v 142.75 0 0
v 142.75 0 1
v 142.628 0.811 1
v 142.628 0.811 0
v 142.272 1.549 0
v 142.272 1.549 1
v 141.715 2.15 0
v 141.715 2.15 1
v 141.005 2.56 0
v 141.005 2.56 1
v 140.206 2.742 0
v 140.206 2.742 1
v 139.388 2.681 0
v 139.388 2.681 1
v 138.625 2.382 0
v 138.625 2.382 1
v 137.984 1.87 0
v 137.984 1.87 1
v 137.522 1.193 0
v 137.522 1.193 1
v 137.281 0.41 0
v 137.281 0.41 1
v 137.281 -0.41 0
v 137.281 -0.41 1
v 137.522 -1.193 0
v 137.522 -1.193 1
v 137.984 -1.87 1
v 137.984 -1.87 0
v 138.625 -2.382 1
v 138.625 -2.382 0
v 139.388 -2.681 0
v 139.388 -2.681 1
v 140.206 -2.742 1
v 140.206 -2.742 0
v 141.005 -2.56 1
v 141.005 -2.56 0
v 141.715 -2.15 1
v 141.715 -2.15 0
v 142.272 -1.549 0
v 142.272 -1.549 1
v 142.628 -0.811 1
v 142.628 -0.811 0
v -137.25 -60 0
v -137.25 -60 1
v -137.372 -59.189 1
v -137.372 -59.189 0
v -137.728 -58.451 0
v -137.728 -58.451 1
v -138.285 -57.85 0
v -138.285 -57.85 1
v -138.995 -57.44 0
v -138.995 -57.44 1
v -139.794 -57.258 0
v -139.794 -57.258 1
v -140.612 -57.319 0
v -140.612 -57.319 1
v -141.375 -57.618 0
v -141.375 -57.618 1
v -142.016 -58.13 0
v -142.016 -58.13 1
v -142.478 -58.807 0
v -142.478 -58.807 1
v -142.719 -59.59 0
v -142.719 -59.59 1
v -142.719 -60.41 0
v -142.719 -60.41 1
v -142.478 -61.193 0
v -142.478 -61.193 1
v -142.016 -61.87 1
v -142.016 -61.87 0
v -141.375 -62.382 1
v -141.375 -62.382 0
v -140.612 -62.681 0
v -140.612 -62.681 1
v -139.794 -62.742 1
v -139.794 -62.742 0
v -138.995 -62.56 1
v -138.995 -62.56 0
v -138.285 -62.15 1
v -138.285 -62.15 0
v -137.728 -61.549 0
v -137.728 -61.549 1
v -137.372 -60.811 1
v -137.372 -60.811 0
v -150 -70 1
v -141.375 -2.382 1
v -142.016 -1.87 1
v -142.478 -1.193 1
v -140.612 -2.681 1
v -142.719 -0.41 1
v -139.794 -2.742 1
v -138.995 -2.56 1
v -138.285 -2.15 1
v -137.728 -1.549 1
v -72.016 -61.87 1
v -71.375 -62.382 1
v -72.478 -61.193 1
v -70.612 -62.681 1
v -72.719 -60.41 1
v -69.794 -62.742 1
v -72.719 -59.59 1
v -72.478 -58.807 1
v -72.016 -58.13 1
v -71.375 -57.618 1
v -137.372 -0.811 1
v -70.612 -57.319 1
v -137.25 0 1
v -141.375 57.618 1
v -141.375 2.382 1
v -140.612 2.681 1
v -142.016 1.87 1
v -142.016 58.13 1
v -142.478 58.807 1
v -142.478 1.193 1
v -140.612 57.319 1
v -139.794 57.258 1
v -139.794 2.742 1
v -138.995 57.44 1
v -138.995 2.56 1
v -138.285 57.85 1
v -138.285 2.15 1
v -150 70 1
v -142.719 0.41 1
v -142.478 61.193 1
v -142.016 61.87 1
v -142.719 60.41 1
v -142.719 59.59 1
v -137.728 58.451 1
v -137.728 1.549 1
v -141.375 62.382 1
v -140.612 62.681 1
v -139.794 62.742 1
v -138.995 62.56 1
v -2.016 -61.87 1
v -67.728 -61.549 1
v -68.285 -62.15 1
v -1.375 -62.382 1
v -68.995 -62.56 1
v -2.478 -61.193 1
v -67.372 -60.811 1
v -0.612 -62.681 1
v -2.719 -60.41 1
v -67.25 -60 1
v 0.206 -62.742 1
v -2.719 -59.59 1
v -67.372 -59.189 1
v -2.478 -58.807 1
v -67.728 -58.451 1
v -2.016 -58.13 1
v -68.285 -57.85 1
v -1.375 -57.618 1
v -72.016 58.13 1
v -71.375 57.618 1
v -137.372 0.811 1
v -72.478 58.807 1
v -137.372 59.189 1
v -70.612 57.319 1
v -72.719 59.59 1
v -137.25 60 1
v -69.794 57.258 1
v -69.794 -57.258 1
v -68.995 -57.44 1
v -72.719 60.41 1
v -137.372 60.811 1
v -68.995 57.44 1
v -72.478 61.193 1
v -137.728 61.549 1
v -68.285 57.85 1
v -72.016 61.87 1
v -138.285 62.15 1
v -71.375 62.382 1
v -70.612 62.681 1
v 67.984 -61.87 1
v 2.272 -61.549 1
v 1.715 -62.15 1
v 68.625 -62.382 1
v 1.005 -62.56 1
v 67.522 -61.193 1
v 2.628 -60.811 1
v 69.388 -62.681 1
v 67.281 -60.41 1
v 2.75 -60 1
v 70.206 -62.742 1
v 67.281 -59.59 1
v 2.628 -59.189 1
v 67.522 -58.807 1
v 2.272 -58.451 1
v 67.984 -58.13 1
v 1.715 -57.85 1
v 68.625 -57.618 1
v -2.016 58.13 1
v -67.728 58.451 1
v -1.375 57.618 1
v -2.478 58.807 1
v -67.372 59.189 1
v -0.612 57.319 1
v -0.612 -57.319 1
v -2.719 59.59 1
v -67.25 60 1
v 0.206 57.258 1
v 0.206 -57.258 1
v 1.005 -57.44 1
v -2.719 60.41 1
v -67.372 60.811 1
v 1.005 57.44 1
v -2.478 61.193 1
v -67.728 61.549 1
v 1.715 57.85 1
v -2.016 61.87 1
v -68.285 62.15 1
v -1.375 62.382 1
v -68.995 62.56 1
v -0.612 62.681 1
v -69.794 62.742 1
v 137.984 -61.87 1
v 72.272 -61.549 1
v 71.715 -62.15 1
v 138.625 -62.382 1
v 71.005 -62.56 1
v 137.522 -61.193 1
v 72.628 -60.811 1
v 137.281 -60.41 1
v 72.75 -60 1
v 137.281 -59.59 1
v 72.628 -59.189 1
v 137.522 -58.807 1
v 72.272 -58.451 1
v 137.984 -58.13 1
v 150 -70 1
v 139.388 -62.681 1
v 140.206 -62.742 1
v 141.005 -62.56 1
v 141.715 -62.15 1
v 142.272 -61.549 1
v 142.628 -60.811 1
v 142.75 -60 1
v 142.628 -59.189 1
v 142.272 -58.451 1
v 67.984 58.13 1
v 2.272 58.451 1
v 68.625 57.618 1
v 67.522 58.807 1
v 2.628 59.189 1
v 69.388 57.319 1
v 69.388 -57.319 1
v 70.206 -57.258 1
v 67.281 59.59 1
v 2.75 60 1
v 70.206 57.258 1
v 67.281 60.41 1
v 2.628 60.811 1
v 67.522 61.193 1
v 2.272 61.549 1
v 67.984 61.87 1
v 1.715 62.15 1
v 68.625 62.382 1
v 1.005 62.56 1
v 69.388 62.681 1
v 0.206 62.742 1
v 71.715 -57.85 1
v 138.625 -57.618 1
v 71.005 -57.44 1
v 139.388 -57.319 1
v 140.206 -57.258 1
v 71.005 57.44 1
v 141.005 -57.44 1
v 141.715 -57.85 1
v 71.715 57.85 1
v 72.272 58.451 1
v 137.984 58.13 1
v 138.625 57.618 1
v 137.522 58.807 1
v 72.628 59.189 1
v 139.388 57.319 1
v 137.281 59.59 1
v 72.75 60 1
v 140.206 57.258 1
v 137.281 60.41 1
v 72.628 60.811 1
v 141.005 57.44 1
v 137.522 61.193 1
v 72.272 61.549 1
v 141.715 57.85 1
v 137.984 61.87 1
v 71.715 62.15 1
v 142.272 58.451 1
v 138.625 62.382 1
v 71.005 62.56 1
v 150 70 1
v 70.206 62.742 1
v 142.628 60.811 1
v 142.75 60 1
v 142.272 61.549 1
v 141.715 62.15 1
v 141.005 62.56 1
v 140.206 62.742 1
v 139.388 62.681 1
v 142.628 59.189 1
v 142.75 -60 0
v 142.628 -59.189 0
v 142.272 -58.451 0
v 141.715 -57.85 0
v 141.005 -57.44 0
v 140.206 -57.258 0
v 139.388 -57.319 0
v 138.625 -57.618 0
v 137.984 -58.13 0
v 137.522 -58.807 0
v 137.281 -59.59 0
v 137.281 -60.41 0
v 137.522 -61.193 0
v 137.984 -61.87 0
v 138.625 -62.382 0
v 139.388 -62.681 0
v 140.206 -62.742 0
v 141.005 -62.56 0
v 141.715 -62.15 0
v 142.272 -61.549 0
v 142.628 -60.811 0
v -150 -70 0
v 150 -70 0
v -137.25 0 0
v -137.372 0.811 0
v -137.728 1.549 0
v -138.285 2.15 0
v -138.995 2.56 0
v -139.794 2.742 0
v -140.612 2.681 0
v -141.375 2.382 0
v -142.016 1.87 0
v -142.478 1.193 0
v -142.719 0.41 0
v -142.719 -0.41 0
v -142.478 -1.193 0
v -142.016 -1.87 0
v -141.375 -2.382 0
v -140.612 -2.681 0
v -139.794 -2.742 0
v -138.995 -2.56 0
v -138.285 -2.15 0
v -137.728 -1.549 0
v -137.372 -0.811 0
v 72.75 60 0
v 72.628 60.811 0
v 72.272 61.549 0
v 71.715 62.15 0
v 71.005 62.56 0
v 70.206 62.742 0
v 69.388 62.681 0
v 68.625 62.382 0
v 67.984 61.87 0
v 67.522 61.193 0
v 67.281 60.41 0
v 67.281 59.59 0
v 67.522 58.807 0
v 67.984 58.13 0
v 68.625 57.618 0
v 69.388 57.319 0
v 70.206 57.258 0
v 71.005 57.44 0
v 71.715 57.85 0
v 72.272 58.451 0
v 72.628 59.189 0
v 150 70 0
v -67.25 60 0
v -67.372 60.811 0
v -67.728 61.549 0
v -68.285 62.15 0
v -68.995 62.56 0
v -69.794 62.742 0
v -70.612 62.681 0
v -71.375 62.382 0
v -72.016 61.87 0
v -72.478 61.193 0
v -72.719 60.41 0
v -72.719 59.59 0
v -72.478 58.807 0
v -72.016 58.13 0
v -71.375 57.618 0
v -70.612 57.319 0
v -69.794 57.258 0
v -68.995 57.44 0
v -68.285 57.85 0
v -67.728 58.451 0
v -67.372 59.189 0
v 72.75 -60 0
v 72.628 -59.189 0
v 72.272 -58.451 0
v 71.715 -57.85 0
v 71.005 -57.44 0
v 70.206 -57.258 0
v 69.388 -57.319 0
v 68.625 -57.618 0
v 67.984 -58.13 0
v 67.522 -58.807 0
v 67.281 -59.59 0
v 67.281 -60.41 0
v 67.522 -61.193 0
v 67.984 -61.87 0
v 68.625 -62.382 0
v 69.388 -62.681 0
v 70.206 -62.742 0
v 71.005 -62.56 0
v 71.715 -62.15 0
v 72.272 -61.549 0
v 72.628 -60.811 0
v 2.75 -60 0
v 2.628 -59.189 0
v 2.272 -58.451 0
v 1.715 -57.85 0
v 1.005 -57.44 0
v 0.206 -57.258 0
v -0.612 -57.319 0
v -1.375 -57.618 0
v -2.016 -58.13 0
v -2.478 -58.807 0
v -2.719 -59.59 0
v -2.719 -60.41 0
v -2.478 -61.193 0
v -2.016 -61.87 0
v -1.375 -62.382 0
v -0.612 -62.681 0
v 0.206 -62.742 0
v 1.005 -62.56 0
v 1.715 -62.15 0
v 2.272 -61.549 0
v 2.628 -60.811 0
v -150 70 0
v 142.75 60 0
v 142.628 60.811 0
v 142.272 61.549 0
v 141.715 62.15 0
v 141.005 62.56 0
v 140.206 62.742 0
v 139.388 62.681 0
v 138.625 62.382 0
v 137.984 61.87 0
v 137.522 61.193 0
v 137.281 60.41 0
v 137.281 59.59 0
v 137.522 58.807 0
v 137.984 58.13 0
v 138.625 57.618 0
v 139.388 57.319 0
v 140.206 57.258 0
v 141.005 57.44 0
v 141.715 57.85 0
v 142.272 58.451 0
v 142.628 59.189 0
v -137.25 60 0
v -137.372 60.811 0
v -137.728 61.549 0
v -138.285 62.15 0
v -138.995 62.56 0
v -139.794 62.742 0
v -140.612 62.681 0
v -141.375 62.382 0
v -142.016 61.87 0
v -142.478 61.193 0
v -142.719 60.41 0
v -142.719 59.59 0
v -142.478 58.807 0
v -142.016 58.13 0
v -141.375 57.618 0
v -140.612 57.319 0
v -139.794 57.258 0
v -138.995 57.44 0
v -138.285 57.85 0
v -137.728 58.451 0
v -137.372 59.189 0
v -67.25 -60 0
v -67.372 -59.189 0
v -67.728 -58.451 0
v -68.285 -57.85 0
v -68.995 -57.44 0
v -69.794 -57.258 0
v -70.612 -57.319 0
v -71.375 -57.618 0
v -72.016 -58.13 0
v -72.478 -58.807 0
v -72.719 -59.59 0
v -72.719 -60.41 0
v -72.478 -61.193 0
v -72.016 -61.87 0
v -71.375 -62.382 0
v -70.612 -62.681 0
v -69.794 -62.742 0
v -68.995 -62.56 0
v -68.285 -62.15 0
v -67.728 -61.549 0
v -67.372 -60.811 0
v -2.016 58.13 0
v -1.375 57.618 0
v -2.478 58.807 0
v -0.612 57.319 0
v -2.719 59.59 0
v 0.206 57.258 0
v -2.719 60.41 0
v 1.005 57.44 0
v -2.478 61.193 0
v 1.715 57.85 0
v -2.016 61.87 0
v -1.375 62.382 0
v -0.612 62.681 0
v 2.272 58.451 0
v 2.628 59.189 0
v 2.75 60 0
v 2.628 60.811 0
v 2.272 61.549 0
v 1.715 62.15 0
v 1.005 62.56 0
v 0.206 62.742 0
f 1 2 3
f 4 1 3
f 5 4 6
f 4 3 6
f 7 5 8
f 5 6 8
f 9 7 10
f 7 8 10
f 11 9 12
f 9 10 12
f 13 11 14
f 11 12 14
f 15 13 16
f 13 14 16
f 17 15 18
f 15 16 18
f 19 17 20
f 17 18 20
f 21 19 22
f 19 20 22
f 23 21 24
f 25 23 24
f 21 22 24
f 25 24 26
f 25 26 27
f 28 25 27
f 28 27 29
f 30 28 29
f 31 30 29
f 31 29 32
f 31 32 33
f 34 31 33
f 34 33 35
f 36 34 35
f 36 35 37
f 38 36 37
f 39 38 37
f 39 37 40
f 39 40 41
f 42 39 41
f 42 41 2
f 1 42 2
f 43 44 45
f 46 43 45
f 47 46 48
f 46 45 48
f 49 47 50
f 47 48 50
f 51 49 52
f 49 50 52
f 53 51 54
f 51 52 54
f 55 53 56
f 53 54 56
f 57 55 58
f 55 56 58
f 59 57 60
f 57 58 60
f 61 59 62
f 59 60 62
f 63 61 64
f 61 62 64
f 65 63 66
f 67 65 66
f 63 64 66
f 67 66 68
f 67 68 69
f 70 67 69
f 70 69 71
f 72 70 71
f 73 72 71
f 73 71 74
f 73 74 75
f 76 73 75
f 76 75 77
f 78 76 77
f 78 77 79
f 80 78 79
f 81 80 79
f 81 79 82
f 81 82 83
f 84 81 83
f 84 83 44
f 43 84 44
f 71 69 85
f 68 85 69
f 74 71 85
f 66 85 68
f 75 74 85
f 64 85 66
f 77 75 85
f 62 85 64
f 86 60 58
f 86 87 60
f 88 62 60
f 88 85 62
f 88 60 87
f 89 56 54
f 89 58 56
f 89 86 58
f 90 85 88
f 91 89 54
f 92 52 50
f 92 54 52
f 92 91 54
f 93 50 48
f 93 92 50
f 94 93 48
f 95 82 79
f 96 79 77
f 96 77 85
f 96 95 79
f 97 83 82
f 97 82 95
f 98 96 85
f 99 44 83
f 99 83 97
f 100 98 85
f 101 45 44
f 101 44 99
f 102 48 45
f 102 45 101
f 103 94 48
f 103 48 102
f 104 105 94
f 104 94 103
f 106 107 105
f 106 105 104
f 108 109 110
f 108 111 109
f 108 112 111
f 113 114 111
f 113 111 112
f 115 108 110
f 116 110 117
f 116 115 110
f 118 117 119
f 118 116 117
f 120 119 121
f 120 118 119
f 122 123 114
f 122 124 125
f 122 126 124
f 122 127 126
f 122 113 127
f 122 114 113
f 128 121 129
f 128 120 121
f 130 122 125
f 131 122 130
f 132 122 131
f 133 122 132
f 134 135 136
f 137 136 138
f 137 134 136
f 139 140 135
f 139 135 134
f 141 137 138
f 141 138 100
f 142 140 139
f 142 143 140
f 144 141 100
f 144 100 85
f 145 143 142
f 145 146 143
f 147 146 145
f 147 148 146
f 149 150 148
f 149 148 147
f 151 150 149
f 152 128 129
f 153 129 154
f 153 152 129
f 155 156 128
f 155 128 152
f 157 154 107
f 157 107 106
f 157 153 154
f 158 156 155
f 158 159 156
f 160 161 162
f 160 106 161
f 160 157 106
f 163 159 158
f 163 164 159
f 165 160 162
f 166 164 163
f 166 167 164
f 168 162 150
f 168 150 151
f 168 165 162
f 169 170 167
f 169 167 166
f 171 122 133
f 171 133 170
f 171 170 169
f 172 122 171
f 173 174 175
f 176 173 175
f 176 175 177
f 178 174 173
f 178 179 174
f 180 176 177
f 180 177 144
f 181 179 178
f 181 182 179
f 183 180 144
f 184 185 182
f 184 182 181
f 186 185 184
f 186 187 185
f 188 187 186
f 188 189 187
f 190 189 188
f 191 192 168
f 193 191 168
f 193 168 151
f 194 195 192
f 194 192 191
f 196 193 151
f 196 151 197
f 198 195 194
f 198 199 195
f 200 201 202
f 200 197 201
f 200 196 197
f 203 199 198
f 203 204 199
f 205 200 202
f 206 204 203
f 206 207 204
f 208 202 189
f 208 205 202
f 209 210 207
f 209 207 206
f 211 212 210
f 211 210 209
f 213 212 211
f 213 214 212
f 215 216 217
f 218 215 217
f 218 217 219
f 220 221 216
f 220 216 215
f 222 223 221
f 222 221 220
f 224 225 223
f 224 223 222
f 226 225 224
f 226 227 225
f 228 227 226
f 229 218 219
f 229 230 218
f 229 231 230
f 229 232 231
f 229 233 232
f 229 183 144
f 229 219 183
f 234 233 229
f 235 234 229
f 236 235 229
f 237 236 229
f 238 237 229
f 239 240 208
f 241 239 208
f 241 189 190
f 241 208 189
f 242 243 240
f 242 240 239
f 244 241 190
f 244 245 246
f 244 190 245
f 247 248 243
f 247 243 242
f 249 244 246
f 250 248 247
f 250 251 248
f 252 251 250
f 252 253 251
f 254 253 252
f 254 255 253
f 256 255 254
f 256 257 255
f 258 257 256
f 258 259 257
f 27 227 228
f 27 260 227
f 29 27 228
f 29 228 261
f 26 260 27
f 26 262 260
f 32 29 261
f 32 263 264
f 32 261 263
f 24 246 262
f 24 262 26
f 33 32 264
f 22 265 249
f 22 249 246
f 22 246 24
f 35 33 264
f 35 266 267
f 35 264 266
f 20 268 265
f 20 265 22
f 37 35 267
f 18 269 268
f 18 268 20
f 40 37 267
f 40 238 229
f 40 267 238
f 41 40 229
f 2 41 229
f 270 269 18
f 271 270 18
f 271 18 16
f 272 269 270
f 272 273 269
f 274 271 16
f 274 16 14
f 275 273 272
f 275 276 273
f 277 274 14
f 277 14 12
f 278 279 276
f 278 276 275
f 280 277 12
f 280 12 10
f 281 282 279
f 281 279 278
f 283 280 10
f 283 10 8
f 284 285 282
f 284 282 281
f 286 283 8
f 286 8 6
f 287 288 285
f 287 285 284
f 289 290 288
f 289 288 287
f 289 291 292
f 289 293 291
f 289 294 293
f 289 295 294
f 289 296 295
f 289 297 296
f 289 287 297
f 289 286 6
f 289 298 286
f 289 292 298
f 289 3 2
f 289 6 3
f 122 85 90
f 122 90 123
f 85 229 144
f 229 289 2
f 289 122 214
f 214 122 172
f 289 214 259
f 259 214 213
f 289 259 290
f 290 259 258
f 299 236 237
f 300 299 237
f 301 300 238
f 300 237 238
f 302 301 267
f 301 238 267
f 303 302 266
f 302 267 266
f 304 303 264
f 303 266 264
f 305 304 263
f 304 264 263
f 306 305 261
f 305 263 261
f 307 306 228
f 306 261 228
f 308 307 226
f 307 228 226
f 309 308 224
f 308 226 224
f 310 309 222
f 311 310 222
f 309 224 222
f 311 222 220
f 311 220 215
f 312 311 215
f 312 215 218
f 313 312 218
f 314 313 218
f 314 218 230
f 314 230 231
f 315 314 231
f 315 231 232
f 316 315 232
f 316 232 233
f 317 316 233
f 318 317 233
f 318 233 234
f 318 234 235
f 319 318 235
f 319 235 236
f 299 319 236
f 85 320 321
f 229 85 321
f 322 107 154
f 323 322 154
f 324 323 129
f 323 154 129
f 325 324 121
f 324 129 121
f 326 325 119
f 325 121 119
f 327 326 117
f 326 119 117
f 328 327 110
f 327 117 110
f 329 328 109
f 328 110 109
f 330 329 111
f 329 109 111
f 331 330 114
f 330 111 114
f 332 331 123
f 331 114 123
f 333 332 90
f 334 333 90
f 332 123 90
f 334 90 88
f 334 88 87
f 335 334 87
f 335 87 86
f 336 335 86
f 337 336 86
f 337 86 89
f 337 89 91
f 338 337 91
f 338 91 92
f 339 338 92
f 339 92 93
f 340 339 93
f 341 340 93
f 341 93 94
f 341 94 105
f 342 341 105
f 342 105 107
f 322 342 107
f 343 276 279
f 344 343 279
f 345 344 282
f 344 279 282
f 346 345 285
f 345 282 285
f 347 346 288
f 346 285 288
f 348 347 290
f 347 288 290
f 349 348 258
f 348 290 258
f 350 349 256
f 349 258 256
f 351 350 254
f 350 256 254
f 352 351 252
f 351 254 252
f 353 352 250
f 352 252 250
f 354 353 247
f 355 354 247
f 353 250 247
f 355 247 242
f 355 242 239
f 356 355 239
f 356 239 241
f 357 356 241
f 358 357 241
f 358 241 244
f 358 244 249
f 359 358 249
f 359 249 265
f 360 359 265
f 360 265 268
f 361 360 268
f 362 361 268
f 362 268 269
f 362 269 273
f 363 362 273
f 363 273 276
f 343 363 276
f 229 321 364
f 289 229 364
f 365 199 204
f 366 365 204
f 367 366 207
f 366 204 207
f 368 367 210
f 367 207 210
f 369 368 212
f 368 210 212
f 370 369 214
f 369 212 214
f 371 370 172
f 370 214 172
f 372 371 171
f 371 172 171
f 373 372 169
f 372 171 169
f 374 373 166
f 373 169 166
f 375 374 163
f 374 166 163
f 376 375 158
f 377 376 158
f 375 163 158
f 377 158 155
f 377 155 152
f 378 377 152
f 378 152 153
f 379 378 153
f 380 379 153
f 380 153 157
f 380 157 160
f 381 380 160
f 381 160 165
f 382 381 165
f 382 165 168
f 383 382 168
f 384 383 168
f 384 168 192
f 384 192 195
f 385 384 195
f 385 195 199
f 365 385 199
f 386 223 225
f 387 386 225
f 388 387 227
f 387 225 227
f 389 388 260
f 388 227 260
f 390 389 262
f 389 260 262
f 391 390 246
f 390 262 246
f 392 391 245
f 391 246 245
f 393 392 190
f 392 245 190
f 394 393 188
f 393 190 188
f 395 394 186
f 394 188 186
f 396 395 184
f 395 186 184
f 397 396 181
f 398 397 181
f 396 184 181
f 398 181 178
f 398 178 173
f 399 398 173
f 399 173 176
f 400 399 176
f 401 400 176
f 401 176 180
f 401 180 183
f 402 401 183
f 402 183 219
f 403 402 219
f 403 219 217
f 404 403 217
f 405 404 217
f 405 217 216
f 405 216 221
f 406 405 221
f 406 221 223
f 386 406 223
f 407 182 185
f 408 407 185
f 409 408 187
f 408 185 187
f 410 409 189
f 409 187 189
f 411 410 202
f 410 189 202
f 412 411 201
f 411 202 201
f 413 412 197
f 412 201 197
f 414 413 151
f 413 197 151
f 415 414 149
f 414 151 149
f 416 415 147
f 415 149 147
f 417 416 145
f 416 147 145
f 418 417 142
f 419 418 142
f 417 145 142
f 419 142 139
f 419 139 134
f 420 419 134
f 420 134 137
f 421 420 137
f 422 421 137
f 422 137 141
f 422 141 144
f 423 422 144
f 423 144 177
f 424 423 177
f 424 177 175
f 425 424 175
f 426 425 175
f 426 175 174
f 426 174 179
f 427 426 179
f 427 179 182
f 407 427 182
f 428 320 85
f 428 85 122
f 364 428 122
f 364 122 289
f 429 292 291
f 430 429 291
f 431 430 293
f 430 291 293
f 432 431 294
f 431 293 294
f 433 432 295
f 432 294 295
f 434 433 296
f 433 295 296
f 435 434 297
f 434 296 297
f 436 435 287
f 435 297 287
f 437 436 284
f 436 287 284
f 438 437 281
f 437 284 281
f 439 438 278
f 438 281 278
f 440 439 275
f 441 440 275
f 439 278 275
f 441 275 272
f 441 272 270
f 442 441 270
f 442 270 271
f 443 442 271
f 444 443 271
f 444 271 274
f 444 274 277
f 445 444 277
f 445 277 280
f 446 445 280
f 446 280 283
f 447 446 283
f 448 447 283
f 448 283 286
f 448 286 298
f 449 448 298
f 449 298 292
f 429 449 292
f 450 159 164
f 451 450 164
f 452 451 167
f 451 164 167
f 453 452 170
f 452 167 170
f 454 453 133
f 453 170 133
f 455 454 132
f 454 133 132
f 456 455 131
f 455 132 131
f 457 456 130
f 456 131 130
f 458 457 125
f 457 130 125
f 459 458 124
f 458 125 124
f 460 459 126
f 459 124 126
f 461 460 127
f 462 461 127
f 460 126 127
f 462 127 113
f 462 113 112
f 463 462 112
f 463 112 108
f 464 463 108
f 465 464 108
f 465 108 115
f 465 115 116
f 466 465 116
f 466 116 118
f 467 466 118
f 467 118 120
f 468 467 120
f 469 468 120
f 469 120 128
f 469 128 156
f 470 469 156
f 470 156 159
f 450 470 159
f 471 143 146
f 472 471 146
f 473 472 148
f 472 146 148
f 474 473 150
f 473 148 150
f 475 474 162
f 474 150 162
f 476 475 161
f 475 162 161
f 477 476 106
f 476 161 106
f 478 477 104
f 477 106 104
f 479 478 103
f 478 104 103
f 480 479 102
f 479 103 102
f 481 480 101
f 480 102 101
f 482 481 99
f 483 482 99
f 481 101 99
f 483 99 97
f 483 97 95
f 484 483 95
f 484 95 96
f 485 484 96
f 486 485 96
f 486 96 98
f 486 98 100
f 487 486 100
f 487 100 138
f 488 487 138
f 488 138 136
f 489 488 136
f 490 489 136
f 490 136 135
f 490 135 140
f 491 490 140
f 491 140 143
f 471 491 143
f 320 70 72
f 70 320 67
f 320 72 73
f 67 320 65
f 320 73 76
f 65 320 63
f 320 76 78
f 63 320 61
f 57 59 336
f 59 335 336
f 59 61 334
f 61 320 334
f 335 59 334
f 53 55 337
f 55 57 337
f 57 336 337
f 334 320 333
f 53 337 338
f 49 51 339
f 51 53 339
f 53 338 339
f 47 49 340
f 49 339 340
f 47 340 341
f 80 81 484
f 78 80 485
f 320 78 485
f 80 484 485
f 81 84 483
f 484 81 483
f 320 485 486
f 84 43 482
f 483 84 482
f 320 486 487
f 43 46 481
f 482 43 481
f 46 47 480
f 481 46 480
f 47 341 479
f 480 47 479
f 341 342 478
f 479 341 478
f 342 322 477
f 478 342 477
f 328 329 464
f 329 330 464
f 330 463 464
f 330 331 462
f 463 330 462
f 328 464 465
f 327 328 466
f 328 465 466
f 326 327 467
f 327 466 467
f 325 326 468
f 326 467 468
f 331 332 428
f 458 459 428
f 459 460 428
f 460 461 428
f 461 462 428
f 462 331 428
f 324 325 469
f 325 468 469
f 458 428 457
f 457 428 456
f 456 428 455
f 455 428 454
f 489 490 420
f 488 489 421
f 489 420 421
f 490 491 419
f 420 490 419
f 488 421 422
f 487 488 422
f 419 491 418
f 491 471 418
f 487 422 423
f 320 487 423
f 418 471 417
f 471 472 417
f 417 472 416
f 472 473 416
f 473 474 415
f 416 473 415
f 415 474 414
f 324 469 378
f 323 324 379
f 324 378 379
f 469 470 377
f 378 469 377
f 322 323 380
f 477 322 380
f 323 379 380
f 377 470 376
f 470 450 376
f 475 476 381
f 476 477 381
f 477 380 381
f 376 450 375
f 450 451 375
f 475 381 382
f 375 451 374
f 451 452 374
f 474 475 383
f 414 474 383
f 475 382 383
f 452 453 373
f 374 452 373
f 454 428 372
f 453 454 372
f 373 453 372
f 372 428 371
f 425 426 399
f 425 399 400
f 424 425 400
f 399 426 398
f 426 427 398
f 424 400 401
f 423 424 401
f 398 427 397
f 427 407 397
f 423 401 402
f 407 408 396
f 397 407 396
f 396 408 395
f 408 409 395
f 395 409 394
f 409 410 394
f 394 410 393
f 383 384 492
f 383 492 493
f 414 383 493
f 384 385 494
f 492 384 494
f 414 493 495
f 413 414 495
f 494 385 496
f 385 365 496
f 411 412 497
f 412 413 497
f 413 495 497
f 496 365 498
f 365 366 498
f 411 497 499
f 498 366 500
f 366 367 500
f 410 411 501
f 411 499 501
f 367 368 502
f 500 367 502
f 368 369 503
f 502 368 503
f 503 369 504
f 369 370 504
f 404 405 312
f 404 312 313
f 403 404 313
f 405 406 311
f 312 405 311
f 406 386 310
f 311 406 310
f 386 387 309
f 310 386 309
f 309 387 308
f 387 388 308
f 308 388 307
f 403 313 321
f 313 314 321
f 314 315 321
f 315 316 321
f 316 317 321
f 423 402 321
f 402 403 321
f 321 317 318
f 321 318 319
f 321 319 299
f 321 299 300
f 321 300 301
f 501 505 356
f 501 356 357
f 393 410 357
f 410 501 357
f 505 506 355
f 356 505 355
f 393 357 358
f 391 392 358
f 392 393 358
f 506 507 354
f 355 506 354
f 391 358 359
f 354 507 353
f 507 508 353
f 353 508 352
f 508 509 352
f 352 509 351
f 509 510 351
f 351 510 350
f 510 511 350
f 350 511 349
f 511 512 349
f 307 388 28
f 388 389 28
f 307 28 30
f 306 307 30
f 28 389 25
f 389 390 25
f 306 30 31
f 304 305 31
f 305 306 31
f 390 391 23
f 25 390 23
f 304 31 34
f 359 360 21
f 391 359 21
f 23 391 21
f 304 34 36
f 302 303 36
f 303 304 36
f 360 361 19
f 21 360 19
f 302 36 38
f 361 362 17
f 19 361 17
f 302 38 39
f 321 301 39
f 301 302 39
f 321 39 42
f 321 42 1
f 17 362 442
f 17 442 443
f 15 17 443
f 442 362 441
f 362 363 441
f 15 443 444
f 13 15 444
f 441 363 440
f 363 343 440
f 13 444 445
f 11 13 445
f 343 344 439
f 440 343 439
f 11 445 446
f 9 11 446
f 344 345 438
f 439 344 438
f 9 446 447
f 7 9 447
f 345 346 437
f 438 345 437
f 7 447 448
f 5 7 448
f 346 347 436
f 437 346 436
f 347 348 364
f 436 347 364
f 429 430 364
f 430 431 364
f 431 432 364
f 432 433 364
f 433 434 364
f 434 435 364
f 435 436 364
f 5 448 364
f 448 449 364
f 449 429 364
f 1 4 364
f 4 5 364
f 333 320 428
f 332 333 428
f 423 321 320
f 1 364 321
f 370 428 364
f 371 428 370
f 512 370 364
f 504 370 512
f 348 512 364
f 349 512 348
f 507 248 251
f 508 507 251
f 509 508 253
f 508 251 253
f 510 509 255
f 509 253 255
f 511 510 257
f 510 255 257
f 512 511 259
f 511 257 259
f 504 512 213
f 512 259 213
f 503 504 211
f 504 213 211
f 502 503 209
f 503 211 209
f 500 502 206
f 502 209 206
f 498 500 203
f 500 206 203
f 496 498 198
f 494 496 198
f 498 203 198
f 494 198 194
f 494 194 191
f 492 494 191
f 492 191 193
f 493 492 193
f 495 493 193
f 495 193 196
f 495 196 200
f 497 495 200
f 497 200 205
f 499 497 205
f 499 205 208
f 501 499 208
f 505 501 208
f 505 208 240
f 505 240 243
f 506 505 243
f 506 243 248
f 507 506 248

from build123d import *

# Parameters (mm, degrees)
SKETCH_1_W         = 300
SKETCH_1_H         = 140
EXTRUDE_1_DEPTH    = 1
HOLE_WIZARD_M5_1_D = 5.5


with BuildPart() as part:
    # 스케치1 → 보스-돌출1 (new body)
    with BuildSketch(Plane.XY):
        Rectangle(SKETCH_1_W, SKETCH_1_H)
    extrude(amount=EXTRUDE_1_DEPTH)

    # M5 여유 구멍1 (through all)
    with Locations(Plane(origin=(0, 0, 0), x_dir=(-1, 0, 0), z_dir=(0, 0, -1))):
        with Locations((-140, 60), (-70, 60), (70, 60), (0, 60), (140, 60), (140, 0), (140, -60), (-140, 0), (-140, -60), (-70, -60), (70, -60), (0, -60)):
            Hole(HOLE_WIZARD_M5_1_D / 2)


solid = part.part
